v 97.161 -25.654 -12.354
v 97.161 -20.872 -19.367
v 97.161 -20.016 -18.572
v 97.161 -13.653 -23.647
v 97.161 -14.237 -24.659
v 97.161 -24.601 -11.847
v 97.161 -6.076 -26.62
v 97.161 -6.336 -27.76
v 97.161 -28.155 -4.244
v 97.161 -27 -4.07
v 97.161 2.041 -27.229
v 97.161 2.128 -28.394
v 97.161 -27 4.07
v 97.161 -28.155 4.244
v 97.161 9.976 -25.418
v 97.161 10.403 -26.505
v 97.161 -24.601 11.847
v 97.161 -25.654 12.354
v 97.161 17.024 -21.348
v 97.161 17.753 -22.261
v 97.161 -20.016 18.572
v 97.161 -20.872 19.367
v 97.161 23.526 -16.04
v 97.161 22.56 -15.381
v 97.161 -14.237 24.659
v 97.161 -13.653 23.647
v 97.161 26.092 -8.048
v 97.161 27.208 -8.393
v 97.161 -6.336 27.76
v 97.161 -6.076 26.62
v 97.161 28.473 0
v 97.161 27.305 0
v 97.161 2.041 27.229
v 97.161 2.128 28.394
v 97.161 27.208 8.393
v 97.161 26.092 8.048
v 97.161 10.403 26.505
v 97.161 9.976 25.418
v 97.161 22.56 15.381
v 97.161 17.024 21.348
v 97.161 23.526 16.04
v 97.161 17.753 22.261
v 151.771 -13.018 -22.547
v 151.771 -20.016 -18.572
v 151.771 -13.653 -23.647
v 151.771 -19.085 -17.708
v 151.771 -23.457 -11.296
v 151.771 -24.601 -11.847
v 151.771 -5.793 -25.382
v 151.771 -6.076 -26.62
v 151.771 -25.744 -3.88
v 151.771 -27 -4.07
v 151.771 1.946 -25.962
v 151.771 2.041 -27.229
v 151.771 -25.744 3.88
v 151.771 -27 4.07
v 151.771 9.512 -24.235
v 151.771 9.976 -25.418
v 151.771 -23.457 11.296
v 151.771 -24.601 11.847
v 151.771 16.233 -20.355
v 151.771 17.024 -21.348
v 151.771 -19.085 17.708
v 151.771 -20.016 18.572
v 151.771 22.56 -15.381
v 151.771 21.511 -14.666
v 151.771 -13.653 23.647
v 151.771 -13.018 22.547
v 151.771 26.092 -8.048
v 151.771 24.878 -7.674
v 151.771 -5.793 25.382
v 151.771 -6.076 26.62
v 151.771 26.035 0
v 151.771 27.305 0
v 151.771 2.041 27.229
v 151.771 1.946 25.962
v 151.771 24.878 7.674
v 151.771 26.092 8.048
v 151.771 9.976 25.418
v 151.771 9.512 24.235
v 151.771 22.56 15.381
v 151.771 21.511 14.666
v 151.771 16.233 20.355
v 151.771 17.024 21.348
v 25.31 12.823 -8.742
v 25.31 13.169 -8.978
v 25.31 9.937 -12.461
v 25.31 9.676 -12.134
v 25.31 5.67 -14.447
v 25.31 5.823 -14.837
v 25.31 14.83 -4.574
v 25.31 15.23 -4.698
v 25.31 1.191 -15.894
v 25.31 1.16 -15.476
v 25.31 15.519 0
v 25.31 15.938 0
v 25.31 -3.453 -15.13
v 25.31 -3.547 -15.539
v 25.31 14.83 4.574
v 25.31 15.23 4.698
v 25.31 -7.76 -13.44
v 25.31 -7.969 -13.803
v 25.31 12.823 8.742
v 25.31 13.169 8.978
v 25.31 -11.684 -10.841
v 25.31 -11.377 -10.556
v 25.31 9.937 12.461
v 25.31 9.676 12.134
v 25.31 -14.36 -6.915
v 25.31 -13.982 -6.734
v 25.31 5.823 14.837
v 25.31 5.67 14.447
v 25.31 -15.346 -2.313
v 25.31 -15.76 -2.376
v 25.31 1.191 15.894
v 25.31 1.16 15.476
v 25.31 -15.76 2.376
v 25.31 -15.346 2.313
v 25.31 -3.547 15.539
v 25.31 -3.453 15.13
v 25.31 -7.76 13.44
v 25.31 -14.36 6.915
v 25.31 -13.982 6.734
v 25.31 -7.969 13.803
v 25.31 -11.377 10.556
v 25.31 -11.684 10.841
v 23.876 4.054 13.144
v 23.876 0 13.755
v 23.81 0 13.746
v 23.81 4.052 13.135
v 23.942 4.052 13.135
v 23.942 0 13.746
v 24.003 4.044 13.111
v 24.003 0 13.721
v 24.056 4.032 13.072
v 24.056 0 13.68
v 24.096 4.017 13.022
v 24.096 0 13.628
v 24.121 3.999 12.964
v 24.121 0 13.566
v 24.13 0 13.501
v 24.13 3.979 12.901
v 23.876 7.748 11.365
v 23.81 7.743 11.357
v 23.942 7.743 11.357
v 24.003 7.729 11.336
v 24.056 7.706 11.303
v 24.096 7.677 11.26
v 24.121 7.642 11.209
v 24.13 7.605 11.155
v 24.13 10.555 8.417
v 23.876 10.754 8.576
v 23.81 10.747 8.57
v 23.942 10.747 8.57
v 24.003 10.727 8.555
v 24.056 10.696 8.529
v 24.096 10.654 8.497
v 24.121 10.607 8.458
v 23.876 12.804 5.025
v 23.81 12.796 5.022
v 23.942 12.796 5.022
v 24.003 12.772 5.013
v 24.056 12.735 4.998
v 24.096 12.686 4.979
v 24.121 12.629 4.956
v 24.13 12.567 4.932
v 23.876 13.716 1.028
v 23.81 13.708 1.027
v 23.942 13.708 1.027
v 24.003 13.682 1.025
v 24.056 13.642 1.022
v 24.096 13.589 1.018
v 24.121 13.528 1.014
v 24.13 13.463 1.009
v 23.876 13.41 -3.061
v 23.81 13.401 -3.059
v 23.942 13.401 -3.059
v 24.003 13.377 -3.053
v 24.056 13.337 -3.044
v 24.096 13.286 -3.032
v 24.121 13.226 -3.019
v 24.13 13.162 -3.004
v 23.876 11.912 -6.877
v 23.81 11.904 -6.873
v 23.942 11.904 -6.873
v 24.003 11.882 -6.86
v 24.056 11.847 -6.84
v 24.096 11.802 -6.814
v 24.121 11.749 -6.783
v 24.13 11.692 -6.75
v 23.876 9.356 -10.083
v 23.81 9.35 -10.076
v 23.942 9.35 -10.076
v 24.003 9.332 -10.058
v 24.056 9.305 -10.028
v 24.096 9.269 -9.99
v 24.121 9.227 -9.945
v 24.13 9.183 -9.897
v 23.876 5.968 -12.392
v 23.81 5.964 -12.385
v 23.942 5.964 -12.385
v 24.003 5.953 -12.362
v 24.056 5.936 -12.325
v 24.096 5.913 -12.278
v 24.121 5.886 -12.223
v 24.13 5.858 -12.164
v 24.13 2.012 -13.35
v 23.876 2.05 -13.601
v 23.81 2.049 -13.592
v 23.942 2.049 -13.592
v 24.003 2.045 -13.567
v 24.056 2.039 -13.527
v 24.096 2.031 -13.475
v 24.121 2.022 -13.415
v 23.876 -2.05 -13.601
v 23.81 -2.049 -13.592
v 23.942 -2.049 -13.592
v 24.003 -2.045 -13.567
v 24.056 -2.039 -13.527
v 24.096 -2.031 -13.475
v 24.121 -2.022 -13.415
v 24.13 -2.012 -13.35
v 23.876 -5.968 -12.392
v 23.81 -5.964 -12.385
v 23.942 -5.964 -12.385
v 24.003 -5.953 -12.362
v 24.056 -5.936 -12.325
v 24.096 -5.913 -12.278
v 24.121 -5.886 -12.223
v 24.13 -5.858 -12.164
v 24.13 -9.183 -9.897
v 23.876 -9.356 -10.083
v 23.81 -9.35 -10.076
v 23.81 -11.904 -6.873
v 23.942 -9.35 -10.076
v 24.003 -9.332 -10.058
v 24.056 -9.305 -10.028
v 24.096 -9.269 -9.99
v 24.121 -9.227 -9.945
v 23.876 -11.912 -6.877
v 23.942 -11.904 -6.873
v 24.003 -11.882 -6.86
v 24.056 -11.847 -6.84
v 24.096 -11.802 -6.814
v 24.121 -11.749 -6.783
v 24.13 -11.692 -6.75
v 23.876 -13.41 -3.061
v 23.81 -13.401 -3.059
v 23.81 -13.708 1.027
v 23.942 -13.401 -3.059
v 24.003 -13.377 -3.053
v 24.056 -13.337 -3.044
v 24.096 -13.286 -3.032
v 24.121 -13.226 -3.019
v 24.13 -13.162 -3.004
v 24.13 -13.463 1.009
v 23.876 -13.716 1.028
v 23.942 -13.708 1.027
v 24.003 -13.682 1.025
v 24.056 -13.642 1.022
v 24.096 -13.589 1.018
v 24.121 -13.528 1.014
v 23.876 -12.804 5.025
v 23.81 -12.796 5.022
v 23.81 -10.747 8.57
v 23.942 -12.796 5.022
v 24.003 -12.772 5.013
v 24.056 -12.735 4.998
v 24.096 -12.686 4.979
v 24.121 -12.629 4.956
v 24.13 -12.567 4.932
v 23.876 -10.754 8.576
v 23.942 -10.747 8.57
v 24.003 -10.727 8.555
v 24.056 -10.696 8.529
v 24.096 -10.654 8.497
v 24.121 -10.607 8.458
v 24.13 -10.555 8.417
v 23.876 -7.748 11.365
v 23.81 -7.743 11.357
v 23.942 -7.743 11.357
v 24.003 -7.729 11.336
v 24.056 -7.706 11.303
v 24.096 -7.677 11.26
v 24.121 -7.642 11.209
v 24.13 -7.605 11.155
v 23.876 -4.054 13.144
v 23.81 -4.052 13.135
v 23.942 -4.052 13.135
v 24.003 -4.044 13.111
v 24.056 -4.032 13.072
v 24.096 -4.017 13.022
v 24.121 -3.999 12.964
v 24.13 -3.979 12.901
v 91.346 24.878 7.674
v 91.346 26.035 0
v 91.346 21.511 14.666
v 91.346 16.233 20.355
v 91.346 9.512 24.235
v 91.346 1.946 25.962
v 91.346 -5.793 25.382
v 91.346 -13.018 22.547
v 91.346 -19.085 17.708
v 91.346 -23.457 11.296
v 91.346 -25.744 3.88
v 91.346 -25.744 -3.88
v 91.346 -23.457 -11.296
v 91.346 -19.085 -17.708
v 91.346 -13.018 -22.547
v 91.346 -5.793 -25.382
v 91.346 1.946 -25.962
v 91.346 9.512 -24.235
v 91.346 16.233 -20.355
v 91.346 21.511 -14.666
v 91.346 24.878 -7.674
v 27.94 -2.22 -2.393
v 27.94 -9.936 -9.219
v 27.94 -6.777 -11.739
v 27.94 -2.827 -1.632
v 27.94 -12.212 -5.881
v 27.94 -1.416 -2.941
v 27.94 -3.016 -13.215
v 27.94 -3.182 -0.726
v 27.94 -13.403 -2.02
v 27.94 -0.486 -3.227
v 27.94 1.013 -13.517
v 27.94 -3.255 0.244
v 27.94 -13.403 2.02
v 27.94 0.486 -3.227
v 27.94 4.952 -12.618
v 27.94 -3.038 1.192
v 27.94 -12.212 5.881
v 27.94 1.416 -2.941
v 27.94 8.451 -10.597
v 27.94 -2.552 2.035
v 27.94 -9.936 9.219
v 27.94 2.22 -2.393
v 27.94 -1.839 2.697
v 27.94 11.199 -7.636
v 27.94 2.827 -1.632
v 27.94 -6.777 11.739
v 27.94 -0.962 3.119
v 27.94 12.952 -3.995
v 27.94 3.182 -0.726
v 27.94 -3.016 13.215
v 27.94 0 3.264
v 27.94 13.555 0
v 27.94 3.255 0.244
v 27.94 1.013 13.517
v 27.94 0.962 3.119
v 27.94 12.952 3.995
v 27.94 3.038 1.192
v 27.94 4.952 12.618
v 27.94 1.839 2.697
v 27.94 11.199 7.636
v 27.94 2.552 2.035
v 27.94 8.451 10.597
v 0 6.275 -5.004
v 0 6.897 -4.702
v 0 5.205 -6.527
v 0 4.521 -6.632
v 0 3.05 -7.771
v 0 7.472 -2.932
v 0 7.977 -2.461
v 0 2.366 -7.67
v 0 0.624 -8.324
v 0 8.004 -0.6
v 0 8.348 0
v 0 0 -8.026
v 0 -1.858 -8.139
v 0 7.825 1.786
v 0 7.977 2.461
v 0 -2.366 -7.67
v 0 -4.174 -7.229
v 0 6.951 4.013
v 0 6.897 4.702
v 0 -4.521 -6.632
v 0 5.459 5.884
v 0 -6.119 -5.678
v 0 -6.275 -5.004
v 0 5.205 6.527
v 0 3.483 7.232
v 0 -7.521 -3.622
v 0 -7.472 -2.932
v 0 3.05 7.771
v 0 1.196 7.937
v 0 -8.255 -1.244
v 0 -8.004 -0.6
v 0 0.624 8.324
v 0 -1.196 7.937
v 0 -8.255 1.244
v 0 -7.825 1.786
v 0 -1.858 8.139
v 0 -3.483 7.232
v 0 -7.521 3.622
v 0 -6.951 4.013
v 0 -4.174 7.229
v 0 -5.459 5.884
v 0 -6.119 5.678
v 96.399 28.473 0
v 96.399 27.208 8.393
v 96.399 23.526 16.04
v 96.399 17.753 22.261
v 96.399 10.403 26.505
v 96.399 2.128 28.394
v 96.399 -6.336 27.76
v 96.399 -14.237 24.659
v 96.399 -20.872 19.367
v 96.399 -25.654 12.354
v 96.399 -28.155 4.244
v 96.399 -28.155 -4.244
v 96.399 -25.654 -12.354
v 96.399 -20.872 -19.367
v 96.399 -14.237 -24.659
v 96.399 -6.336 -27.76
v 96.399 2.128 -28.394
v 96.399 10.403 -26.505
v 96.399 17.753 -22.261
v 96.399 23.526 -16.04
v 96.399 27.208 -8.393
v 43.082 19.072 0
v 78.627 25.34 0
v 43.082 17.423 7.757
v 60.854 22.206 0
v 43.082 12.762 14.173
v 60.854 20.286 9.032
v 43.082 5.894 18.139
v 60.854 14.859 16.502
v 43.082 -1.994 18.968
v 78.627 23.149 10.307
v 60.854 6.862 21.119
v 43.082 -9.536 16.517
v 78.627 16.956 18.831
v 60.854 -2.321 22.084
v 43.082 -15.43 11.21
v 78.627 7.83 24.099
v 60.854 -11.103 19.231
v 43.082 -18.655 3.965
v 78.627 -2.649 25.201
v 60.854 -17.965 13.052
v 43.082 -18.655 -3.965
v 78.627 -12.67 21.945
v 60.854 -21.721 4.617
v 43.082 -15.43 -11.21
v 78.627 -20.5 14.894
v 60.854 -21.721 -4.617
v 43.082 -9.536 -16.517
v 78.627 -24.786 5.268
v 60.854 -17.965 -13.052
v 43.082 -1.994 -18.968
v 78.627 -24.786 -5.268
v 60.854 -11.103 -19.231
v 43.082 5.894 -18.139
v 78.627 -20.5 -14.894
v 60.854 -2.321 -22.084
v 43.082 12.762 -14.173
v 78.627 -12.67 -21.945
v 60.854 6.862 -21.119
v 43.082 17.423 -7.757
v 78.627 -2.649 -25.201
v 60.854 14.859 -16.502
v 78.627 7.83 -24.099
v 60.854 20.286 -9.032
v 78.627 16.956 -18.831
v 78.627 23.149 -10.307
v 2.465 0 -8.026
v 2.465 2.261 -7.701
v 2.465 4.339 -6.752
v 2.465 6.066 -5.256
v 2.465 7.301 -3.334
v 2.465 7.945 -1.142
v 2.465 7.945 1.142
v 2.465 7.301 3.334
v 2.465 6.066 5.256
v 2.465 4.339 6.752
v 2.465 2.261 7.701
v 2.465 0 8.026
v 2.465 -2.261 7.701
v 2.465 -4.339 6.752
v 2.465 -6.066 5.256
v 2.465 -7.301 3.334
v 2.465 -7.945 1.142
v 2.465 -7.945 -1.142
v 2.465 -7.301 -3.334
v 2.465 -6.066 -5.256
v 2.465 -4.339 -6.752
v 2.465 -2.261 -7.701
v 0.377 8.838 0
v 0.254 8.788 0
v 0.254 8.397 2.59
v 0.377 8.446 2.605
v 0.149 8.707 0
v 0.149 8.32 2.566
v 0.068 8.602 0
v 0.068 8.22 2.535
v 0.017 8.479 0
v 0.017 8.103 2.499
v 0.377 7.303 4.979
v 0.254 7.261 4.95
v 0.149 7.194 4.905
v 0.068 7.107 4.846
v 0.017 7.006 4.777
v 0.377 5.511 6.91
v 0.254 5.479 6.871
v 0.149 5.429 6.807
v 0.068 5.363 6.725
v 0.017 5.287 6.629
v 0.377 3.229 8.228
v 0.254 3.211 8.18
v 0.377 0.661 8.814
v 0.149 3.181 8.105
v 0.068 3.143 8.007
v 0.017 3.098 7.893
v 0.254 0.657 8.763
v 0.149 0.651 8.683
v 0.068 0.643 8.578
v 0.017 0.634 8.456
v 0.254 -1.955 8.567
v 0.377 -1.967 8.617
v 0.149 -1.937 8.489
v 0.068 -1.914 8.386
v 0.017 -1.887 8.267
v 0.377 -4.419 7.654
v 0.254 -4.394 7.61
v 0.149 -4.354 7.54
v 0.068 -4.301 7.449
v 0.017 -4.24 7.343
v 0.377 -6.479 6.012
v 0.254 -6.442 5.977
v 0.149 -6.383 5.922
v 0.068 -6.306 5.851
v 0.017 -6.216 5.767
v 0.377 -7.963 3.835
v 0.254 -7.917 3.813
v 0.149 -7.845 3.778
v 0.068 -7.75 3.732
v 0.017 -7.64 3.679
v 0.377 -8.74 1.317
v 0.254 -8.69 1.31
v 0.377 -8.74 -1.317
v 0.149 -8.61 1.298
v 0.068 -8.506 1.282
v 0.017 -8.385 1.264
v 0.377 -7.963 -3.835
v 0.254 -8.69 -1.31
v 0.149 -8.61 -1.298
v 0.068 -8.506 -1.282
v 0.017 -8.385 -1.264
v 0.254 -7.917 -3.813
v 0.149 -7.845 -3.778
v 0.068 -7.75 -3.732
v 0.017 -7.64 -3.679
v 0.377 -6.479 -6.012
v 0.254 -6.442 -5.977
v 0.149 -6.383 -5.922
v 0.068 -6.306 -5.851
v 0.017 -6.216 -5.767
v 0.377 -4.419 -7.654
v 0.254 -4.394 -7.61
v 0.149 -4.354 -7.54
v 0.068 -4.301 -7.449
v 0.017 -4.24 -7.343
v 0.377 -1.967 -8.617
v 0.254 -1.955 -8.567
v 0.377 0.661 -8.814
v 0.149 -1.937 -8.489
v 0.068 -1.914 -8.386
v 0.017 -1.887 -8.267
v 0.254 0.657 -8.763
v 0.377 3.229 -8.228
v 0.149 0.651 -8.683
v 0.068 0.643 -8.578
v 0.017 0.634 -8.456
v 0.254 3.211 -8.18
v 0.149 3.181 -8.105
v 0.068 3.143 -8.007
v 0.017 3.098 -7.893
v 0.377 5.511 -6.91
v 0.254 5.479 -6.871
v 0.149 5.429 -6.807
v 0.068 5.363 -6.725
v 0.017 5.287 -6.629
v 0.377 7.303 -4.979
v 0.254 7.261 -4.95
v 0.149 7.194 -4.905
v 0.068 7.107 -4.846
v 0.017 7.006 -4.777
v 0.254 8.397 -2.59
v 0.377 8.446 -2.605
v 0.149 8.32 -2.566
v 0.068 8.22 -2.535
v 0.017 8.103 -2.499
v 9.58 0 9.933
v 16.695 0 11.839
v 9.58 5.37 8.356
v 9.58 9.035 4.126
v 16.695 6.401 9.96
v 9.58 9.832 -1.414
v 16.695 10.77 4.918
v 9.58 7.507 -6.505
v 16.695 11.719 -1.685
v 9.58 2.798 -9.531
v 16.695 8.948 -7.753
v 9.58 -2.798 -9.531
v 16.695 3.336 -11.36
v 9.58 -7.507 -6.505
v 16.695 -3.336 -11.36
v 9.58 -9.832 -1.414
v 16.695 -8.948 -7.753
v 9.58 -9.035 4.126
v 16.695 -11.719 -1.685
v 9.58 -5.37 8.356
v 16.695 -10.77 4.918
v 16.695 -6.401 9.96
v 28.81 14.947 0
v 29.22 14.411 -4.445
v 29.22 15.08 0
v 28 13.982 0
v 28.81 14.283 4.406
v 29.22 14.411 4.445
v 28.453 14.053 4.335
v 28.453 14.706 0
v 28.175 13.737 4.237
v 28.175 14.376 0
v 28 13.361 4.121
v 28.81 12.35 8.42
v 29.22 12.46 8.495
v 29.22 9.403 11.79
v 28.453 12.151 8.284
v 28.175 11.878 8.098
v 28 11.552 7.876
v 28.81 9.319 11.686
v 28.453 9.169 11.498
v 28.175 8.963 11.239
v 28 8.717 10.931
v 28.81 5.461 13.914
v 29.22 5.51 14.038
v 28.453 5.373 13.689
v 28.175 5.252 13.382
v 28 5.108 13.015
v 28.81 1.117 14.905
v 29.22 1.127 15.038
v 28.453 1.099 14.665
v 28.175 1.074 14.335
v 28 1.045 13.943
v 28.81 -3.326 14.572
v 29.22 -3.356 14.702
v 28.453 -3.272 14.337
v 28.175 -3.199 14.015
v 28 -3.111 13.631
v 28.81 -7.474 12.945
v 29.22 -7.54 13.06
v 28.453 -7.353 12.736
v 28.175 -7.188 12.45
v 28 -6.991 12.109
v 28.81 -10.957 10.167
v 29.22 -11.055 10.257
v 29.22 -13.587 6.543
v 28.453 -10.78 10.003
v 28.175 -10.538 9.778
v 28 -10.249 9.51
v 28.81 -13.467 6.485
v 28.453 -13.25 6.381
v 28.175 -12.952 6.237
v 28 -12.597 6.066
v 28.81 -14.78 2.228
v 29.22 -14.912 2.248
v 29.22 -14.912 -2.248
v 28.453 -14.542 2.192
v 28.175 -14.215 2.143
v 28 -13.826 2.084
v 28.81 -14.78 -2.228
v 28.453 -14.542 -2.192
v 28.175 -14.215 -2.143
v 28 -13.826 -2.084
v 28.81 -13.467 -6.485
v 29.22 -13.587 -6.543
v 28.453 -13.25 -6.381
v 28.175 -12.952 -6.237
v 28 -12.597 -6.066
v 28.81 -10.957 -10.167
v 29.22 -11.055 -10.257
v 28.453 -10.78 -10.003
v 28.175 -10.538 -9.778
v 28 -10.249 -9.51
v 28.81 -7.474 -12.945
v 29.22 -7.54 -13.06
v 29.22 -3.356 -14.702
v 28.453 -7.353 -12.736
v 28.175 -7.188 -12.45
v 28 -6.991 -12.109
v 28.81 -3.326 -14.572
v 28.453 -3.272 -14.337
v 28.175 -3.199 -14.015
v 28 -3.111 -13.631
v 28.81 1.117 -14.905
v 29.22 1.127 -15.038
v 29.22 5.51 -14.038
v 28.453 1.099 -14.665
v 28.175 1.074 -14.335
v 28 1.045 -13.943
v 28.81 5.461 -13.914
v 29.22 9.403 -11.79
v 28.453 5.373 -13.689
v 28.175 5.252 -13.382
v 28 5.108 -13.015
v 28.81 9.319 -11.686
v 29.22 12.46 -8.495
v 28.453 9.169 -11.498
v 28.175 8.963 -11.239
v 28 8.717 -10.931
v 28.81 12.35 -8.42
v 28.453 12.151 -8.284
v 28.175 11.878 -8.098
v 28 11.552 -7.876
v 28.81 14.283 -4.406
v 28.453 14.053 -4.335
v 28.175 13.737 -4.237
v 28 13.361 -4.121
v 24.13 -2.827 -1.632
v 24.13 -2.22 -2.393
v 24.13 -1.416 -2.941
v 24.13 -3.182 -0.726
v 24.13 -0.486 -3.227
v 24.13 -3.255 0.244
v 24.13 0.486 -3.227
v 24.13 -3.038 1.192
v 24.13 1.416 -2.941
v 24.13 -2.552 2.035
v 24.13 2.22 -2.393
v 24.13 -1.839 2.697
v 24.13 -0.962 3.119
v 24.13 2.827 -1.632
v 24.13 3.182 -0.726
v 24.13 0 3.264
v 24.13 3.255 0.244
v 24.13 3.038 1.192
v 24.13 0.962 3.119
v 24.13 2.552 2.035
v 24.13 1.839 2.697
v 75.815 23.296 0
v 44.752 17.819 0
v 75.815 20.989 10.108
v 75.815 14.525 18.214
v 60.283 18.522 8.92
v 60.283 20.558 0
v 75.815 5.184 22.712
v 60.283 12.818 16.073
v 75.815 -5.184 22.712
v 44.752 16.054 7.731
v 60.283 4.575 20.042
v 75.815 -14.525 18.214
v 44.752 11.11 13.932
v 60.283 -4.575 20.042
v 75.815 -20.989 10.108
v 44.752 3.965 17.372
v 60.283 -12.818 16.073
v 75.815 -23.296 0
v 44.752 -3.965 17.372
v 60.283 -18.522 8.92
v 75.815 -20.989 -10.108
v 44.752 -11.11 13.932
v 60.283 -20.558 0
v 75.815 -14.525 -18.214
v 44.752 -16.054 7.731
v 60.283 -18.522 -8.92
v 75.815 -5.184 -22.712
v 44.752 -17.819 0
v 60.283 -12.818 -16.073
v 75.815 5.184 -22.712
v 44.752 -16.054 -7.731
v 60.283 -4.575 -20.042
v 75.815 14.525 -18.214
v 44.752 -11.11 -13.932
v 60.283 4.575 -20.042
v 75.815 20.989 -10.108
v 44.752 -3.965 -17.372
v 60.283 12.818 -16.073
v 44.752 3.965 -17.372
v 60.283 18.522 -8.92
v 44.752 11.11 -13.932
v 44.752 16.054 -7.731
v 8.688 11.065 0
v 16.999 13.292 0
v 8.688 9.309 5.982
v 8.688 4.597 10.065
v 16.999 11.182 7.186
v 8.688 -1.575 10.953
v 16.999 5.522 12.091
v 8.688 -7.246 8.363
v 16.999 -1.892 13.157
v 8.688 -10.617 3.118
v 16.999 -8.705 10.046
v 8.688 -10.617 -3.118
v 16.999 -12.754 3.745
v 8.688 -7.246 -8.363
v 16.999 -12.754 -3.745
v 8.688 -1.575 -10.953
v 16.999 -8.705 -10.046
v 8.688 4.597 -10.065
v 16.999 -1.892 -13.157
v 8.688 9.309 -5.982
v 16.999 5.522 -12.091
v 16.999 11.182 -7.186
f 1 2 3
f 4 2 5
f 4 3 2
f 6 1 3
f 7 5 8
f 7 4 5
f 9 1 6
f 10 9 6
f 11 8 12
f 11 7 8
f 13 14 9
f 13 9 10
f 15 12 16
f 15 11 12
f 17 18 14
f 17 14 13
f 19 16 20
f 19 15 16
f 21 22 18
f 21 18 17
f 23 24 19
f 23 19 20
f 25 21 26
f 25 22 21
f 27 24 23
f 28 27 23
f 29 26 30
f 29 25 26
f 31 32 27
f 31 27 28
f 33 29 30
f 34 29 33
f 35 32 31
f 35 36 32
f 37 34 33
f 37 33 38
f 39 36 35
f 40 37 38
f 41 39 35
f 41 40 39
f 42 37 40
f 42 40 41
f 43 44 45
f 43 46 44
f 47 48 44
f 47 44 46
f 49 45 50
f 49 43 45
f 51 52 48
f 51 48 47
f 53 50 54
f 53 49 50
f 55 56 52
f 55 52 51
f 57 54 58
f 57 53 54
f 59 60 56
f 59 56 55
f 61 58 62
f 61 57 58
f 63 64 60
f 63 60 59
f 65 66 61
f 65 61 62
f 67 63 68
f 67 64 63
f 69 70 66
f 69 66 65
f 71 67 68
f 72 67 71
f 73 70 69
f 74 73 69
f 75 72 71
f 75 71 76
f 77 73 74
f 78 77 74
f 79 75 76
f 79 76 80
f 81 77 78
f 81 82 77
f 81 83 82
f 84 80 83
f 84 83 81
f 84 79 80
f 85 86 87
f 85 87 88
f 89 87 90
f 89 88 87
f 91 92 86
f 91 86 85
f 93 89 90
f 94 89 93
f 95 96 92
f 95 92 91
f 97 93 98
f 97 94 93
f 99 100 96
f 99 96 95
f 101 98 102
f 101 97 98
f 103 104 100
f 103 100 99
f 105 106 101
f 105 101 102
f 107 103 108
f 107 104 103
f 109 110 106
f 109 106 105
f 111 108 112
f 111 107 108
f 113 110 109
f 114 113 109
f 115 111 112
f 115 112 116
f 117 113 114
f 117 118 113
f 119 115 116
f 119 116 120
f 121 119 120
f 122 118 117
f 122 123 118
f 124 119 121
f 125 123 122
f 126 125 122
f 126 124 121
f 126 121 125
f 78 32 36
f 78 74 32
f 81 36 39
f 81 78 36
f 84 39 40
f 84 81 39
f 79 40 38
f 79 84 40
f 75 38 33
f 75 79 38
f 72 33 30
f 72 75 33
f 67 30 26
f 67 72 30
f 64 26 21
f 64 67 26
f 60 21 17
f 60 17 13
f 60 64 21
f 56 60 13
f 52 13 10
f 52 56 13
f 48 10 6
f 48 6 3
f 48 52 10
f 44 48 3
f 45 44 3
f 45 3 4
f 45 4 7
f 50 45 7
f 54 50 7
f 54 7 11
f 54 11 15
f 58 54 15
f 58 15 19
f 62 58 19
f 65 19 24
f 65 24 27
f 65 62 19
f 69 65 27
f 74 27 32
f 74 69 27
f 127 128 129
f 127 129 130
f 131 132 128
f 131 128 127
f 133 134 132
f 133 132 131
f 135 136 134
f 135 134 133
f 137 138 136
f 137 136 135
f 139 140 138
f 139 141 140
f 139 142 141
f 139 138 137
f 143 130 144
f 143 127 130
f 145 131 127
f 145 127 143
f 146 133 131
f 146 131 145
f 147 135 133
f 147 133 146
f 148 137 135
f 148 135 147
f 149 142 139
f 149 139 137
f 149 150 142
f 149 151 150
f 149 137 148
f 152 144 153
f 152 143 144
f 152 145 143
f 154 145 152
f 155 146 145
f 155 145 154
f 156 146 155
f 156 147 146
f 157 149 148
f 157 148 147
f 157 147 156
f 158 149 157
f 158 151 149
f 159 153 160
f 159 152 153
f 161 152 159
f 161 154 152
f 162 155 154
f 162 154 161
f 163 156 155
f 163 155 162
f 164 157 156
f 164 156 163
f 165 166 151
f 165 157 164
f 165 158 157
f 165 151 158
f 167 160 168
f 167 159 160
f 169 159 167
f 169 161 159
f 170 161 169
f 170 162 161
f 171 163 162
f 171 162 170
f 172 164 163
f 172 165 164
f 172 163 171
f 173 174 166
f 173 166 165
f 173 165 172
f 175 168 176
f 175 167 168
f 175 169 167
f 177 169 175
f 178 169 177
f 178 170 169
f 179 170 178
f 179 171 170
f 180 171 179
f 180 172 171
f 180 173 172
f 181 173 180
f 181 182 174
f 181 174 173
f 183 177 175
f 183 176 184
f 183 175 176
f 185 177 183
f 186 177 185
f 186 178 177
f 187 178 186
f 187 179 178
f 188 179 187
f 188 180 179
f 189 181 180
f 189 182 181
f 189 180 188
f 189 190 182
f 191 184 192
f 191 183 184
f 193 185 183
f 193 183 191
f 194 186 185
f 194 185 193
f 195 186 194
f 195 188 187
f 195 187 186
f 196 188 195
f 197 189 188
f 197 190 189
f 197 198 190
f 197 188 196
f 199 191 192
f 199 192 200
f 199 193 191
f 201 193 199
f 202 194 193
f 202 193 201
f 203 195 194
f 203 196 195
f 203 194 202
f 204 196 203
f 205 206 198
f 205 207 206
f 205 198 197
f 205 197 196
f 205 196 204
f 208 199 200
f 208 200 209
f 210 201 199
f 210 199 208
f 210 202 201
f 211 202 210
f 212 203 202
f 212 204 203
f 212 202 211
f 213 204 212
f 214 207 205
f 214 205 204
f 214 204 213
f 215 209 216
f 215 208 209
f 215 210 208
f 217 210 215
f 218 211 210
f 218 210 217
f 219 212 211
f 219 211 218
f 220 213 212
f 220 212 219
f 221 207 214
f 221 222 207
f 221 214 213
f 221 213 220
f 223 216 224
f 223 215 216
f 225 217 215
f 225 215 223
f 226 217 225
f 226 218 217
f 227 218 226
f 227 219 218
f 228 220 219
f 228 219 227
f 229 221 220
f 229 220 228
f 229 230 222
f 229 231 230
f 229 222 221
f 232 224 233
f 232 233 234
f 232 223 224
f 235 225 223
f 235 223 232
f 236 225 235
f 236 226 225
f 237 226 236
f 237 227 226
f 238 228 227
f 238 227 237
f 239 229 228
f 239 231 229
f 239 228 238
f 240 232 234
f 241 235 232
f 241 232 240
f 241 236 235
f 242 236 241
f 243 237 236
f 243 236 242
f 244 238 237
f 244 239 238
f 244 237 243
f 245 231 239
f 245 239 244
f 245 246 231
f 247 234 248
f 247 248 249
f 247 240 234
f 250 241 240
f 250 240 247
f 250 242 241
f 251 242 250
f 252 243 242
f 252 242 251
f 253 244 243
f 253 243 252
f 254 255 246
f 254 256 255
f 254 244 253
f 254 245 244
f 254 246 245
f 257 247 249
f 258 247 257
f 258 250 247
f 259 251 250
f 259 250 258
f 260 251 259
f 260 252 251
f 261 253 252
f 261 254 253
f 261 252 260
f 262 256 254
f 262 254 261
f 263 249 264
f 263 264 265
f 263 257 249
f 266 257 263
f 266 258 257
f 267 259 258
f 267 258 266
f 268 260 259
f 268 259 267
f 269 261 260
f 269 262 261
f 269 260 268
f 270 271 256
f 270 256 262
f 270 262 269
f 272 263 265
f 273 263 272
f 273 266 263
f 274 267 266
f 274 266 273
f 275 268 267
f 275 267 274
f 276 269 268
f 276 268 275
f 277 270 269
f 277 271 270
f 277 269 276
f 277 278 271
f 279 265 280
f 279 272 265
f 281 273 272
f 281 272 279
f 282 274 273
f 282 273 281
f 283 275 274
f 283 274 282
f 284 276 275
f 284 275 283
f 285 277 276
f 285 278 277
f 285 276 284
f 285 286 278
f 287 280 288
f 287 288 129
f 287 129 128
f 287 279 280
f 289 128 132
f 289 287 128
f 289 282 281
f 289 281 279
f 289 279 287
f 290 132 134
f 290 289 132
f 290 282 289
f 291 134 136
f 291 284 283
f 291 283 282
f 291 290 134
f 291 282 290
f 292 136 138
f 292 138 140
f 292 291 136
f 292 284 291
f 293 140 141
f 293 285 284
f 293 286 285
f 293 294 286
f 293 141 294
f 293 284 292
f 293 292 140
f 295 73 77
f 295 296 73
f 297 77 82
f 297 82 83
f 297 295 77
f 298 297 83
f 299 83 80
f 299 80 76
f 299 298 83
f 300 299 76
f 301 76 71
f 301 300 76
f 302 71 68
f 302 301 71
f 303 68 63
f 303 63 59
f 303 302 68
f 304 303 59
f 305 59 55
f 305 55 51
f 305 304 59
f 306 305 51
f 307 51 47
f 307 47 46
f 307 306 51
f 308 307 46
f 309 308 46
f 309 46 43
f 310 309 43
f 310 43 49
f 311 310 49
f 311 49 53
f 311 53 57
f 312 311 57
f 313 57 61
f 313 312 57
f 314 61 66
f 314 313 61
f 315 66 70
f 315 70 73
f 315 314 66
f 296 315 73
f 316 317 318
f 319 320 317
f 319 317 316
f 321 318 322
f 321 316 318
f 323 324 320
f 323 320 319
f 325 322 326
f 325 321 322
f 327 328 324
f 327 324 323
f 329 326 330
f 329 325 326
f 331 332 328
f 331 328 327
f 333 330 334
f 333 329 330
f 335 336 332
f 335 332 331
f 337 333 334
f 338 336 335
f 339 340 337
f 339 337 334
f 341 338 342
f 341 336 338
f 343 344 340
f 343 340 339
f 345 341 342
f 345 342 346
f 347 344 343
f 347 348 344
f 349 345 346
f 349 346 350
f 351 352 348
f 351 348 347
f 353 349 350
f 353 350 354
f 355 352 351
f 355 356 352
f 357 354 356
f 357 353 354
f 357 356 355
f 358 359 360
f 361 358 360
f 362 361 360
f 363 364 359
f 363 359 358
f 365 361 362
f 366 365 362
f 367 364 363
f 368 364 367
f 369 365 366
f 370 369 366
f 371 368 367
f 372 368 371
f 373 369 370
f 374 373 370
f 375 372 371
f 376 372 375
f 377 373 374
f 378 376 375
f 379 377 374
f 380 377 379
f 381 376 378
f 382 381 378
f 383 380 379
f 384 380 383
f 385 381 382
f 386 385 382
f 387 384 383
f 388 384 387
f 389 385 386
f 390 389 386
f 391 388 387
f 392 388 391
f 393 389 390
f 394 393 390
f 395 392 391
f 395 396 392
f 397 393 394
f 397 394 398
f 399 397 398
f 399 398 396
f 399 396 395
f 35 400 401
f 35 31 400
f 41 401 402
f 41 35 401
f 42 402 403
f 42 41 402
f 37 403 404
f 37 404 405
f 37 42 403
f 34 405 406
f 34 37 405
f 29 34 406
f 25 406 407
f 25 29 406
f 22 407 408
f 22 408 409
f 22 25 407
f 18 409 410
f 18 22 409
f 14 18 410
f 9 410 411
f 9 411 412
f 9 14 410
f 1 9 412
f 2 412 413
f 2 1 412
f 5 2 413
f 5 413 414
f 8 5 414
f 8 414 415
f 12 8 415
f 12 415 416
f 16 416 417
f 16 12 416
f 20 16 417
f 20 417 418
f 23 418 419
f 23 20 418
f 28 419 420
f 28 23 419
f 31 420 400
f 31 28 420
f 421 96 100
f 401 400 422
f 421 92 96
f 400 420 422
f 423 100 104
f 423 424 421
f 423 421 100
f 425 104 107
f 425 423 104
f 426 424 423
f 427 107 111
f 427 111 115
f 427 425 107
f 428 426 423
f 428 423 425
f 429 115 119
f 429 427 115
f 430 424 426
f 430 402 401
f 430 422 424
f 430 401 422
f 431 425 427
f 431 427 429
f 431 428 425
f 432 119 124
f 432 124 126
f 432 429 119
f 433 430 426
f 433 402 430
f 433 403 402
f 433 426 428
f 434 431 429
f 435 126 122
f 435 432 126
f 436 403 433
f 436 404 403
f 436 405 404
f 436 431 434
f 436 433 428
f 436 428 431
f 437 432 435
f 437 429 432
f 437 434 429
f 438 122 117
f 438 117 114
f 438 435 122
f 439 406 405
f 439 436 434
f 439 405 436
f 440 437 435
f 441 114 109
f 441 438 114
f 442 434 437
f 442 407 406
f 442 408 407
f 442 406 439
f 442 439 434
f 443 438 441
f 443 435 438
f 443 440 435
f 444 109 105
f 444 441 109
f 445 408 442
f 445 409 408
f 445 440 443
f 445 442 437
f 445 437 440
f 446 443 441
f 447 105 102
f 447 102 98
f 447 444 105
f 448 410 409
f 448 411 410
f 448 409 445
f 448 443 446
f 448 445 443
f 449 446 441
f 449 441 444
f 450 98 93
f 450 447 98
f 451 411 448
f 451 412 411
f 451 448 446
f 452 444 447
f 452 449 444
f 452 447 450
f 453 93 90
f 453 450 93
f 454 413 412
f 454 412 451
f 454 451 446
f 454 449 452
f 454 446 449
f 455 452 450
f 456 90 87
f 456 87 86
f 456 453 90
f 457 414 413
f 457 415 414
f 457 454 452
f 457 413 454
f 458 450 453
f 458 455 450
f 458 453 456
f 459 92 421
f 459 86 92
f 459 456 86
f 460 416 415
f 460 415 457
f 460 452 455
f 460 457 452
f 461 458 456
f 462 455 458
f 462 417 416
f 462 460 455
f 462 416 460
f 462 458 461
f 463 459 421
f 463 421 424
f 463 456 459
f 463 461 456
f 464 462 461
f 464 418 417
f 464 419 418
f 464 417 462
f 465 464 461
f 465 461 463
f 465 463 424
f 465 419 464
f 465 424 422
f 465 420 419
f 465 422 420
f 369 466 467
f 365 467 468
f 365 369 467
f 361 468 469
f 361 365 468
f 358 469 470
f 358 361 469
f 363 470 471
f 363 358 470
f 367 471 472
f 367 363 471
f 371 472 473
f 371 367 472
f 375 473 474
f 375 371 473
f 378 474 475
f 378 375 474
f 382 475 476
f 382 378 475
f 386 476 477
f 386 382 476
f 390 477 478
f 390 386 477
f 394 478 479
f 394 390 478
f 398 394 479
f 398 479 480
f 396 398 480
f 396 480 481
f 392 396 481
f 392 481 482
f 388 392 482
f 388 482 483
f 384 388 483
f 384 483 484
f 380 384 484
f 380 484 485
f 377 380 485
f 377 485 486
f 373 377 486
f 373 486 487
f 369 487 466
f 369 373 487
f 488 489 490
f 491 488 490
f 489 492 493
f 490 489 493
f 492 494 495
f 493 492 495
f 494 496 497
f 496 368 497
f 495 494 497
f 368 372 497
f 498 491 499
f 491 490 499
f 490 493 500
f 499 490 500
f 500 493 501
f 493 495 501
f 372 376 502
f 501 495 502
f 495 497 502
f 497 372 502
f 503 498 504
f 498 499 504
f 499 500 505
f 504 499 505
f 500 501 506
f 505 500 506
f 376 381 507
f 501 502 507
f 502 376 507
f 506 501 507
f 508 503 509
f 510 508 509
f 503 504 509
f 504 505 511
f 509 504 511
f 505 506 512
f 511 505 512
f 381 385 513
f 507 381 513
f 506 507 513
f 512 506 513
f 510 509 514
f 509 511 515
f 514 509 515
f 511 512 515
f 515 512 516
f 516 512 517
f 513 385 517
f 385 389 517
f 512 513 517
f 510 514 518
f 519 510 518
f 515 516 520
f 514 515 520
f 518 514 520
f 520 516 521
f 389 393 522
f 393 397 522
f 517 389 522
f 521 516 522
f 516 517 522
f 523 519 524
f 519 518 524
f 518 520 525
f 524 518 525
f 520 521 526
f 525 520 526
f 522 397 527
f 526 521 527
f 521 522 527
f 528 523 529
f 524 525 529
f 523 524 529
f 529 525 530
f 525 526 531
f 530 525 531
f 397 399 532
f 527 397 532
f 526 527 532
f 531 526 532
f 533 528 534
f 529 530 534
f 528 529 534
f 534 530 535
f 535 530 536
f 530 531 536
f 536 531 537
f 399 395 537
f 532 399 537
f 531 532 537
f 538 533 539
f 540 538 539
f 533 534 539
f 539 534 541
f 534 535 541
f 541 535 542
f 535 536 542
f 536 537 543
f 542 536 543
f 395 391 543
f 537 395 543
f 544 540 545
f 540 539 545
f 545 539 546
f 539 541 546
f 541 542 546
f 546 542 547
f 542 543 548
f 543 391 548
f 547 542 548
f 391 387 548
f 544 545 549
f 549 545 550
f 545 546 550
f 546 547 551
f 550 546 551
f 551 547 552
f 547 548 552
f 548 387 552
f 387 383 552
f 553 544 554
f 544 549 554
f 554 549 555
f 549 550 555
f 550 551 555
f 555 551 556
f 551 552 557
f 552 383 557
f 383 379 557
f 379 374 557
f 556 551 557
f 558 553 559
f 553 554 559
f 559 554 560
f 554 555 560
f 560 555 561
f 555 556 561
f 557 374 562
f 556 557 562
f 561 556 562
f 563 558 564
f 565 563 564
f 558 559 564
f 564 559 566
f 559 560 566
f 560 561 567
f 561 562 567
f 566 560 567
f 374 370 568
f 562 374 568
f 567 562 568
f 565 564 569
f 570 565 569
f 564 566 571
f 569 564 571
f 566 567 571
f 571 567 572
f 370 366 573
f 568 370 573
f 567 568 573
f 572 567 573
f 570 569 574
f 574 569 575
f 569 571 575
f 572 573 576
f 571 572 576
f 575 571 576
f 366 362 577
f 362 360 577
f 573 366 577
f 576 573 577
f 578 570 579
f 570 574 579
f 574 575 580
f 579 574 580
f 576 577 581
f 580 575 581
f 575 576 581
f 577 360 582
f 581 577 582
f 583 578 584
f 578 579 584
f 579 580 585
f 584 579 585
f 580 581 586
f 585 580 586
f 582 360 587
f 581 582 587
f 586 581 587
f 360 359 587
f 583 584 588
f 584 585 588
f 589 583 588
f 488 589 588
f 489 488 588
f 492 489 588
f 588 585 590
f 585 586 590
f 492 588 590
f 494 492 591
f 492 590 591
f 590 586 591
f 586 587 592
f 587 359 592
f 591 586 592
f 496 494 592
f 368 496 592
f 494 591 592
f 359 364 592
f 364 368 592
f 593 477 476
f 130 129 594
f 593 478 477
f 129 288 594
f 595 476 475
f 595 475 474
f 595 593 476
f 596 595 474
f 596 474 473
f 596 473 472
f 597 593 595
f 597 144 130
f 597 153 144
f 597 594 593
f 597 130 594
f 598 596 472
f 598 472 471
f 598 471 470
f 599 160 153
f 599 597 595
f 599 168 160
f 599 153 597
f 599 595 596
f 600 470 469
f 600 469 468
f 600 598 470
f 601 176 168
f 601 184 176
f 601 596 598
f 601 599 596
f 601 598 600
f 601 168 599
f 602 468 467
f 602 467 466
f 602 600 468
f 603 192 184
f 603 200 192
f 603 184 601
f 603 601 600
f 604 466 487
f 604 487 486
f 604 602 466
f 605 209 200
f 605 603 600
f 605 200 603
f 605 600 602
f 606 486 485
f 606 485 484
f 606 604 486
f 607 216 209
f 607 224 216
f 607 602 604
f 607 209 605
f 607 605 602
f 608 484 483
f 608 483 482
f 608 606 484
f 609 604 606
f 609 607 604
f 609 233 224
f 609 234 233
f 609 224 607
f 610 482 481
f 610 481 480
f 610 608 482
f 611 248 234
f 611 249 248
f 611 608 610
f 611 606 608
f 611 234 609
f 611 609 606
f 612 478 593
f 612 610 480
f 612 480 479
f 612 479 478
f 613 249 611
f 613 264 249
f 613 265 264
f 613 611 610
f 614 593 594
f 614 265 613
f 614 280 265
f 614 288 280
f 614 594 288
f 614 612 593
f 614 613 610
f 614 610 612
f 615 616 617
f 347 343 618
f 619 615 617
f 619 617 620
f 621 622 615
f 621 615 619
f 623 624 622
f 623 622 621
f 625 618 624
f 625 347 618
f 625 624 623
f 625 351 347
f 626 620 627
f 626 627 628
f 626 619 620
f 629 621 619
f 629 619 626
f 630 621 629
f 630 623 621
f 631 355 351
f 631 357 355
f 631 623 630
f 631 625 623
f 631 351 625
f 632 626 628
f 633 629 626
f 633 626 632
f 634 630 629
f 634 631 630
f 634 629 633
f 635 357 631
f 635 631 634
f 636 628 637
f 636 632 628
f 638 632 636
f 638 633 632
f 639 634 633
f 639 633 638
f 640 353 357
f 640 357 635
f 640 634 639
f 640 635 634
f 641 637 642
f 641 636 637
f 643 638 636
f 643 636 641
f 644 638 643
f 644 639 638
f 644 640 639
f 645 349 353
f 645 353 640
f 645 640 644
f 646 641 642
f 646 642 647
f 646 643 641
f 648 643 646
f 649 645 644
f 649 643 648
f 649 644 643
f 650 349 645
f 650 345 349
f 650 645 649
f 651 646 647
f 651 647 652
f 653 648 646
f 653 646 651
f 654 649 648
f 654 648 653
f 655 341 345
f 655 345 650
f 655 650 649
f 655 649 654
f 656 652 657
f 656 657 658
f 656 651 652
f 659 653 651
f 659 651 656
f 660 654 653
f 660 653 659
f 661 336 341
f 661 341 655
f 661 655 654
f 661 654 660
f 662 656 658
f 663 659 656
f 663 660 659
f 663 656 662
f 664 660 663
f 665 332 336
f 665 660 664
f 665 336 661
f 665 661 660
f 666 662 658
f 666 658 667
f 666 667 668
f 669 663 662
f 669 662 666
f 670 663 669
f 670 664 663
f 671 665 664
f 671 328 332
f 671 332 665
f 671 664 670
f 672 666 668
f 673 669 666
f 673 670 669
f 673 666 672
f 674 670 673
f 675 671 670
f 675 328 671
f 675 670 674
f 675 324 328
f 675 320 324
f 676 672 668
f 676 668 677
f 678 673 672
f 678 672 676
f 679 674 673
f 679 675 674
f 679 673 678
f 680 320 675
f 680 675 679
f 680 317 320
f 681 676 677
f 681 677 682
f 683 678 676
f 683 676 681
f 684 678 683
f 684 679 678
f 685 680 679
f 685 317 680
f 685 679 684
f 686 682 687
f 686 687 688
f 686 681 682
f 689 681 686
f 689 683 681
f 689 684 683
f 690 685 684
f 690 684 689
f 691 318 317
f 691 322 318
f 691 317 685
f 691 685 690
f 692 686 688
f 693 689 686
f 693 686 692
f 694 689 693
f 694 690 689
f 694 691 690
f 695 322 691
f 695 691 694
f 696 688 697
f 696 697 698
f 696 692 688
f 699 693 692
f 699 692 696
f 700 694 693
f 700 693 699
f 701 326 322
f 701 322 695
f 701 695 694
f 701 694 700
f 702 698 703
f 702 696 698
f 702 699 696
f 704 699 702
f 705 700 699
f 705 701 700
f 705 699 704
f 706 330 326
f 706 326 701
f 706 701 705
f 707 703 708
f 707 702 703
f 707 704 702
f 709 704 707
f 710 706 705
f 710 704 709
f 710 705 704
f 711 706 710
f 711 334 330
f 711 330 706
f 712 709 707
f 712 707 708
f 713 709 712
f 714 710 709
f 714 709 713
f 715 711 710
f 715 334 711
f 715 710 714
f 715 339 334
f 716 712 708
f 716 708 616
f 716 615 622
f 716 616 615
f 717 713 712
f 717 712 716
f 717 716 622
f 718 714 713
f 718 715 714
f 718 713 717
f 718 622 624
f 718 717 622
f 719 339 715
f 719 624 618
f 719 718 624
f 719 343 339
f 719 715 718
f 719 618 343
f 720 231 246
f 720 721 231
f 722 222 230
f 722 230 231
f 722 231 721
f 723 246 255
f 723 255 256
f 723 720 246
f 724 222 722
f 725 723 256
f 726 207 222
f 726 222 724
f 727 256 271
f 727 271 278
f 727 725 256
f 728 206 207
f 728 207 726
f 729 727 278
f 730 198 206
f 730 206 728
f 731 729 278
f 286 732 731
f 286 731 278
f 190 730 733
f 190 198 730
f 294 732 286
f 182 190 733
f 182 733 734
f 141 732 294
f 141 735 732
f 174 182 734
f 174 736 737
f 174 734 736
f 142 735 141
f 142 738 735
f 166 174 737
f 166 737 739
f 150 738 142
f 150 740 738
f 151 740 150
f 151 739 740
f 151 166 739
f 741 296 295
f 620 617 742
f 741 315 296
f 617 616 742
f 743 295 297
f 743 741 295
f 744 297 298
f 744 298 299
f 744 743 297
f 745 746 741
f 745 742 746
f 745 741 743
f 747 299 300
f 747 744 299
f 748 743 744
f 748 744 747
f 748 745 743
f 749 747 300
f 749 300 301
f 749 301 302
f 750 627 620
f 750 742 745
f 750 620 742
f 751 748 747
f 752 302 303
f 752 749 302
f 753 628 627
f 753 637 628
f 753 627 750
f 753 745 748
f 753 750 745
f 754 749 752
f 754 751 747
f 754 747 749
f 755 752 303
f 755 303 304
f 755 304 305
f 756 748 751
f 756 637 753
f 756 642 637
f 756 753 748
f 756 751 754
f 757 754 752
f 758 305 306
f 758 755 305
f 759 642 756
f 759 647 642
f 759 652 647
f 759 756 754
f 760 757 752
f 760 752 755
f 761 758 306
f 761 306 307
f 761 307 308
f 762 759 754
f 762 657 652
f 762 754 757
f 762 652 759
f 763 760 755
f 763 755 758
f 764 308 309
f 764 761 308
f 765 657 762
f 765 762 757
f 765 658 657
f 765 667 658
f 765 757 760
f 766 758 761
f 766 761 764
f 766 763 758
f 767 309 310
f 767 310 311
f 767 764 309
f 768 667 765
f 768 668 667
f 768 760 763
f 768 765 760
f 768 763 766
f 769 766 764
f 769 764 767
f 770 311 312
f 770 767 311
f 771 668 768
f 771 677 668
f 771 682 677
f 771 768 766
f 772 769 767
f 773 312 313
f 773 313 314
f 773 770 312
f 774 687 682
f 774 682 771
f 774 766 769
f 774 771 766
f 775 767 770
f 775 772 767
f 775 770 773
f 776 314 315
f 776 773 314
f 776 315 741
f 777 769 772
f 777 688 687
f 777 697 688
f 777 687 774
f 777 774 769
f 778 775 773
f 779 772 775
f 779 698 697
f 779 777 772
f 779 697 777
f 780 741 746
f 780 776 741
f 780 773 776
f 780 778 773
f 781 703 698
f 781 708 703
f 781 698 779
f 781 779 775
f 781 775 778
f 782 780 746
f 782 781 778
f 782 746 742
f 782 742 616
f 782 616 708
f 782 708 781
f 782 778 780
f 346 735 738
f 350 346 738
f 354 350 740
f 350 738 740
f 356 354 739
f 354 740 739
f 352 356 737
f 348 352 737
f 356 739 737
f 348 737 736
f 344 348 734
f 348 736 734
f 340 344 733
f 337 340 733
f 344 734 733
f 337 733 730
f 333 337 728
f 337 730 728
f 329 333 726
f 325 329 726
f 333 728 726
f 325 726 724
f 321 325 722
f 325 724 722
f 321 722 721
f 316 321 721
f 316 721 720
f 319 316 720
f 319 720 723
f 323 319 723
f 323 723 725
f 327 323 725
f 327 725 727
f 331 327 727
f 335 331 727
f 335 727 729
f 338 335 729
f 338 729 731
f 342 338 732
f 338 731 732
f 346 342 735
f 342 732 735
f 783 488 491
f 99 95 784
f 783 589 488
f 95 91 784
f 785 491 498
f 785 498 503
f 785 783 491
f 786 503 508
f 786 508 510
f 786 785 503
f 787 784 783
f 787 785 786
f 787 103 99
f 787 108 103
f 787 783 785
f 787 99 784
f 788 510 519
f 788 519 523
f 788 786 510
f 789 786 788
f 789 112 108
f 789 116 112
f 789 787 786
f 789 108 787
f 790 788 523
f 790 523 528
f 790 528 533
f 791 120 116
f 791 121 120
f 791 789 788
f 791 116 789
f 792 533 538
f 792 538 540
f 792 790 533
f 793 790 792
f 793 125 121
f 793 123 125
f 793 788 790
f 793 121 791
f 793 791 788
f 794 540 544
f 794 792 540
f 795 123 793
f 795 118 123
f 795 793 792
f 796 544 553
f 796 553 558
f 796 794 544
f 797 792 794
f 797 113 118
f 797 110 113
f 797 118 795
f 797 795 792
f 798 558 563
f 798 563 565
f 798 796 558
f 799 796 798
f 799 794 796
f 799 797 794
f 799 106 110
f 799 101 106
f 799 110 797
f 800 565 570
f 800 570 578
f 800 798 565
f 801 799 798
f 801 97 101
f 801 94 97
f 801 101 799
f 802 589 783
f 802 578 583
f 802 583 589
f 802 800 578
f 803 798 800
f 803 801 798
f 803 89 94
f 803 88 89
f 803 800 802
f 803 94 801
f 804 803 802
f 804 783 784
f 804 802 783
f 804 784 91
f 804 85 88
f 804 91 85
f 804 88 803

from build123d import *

# Parameters (mm, degrees)
FILLET1_R                    = 1.5494
F_0_257_DIAMETER_HOLE1_D     = 6.5278
F_0_257_DIAMETER_HOLE1_DEPTH = 13.913851026
F_0_257_DIAMETER_HOLE1_TIP   = 1.961148974
FILLET2_R                    = 0.508
SKETCH4_R                    = 7.366
CUT_EXTRUDE1_DEPTH           = 24.13
CUT_EXTRUDE1_TAPER           = -15
FILLET3_R                    = 0.254
CUT_EXTRUDE2_REACH           = 153.771
SKETCH5_R                    = 8.0264


with BuildPart() as part:
    # Sketch1 → Revolve1 (revolve)
    with BuildSketch(Plane.XY):
        Polygon((25.310022167, 15.9385), (96.398972647, 28.4734), (97.160972647, 28.4734), (97.160972647, 27.305), (151.770972647, 27.305), (151.770972647, 26.035), (91.346485275, 26.035), (27.94, 14.854725894), (27.94, 0), (0, 0), (0, 8.7376), (25.310022167, 15.5194), align=None)
    revolve(axis=Axis((0, 0, 0), (1, 0, 0)))

    # Fillet1
    fillet1_edges = [part.edges().sort_by_distance(p)[0] for p in [
        (27.94, -14.854725894, 0),
    ]]
    fillet(fillet1_edges, radius=FILLET1_R)

    # F (0.257) Diameter Hole1
    with Locations(Plane(origin=(27.94, 0, 0), x_dir=(0, 0, -1), z_dir=(1, 0, 0))):
        with Locations((0, 0)):
            Hole(F_0_257_DIAMETER_HOLE1_D / 2, depth=F_0_257_DIAMETER_HOLE1_DEPTH)
            with Locations((0, 0, -(F_0_257_DIAMETER_HOLE1_DEPTH + F_0_257_DIAMETER_HOLE1_TIP / 2))):  # 118° drill point
                Cone(0, F_0_257_DIAMETER_HOLE1_D / 2, F_0_257_DIAMETER_HOLE1_TIP, mode=Mode.SUBTRACT)

    # Fillet2
    fillet2_edges = [part.edges().sort_by_distance(p)[0] for p in [
        (0, -8.7376, 0),
    ]]
    fillet(fillet2_edges, radius=FILLET2_R)

    # Sketch4 → Cut-Extrude1 (cut)
    with BuildSketch(Plane.ZY):
        Circle(SKETCH4_R)
    extrude(amount=-CUT_EXTRUDE1_DEPTH, taper=CUT_EXTRUDE1_TAPER, mode=Mode.SUBTRACT)

    # Fillet3
    fillet3_edges = [part.edges().sort_by_distance(p)[0] for p in [
        (24.13, 0, -13.831614013),
    ]]
    fillet(fillet3_edges, radius=FILLET3_R)

    # Sketch5 → Cut-Extrude2 (cut, up to next)
    with BuildSketch(Plane(origin=(0, 0, 0), x_dir=(0, 0, -1), z_dir=(1, 0, 0)), mode=Mode.PRIVATE) as cut_extrude2_sk1:
        Circle(SKETCH5_R)
    cut_extrude2_tool1 = extrude(cut_extrude2_sk1.sketch, amount=CUT_EXTRUDE2_REACH, mode=Mode.PRIVATE) & part.part
    add(cut_extrude2_tool1.solids().sort_by_distance((0, 0, 0))[0], mode=Mode.SUBTRACT)


solid = part.part
